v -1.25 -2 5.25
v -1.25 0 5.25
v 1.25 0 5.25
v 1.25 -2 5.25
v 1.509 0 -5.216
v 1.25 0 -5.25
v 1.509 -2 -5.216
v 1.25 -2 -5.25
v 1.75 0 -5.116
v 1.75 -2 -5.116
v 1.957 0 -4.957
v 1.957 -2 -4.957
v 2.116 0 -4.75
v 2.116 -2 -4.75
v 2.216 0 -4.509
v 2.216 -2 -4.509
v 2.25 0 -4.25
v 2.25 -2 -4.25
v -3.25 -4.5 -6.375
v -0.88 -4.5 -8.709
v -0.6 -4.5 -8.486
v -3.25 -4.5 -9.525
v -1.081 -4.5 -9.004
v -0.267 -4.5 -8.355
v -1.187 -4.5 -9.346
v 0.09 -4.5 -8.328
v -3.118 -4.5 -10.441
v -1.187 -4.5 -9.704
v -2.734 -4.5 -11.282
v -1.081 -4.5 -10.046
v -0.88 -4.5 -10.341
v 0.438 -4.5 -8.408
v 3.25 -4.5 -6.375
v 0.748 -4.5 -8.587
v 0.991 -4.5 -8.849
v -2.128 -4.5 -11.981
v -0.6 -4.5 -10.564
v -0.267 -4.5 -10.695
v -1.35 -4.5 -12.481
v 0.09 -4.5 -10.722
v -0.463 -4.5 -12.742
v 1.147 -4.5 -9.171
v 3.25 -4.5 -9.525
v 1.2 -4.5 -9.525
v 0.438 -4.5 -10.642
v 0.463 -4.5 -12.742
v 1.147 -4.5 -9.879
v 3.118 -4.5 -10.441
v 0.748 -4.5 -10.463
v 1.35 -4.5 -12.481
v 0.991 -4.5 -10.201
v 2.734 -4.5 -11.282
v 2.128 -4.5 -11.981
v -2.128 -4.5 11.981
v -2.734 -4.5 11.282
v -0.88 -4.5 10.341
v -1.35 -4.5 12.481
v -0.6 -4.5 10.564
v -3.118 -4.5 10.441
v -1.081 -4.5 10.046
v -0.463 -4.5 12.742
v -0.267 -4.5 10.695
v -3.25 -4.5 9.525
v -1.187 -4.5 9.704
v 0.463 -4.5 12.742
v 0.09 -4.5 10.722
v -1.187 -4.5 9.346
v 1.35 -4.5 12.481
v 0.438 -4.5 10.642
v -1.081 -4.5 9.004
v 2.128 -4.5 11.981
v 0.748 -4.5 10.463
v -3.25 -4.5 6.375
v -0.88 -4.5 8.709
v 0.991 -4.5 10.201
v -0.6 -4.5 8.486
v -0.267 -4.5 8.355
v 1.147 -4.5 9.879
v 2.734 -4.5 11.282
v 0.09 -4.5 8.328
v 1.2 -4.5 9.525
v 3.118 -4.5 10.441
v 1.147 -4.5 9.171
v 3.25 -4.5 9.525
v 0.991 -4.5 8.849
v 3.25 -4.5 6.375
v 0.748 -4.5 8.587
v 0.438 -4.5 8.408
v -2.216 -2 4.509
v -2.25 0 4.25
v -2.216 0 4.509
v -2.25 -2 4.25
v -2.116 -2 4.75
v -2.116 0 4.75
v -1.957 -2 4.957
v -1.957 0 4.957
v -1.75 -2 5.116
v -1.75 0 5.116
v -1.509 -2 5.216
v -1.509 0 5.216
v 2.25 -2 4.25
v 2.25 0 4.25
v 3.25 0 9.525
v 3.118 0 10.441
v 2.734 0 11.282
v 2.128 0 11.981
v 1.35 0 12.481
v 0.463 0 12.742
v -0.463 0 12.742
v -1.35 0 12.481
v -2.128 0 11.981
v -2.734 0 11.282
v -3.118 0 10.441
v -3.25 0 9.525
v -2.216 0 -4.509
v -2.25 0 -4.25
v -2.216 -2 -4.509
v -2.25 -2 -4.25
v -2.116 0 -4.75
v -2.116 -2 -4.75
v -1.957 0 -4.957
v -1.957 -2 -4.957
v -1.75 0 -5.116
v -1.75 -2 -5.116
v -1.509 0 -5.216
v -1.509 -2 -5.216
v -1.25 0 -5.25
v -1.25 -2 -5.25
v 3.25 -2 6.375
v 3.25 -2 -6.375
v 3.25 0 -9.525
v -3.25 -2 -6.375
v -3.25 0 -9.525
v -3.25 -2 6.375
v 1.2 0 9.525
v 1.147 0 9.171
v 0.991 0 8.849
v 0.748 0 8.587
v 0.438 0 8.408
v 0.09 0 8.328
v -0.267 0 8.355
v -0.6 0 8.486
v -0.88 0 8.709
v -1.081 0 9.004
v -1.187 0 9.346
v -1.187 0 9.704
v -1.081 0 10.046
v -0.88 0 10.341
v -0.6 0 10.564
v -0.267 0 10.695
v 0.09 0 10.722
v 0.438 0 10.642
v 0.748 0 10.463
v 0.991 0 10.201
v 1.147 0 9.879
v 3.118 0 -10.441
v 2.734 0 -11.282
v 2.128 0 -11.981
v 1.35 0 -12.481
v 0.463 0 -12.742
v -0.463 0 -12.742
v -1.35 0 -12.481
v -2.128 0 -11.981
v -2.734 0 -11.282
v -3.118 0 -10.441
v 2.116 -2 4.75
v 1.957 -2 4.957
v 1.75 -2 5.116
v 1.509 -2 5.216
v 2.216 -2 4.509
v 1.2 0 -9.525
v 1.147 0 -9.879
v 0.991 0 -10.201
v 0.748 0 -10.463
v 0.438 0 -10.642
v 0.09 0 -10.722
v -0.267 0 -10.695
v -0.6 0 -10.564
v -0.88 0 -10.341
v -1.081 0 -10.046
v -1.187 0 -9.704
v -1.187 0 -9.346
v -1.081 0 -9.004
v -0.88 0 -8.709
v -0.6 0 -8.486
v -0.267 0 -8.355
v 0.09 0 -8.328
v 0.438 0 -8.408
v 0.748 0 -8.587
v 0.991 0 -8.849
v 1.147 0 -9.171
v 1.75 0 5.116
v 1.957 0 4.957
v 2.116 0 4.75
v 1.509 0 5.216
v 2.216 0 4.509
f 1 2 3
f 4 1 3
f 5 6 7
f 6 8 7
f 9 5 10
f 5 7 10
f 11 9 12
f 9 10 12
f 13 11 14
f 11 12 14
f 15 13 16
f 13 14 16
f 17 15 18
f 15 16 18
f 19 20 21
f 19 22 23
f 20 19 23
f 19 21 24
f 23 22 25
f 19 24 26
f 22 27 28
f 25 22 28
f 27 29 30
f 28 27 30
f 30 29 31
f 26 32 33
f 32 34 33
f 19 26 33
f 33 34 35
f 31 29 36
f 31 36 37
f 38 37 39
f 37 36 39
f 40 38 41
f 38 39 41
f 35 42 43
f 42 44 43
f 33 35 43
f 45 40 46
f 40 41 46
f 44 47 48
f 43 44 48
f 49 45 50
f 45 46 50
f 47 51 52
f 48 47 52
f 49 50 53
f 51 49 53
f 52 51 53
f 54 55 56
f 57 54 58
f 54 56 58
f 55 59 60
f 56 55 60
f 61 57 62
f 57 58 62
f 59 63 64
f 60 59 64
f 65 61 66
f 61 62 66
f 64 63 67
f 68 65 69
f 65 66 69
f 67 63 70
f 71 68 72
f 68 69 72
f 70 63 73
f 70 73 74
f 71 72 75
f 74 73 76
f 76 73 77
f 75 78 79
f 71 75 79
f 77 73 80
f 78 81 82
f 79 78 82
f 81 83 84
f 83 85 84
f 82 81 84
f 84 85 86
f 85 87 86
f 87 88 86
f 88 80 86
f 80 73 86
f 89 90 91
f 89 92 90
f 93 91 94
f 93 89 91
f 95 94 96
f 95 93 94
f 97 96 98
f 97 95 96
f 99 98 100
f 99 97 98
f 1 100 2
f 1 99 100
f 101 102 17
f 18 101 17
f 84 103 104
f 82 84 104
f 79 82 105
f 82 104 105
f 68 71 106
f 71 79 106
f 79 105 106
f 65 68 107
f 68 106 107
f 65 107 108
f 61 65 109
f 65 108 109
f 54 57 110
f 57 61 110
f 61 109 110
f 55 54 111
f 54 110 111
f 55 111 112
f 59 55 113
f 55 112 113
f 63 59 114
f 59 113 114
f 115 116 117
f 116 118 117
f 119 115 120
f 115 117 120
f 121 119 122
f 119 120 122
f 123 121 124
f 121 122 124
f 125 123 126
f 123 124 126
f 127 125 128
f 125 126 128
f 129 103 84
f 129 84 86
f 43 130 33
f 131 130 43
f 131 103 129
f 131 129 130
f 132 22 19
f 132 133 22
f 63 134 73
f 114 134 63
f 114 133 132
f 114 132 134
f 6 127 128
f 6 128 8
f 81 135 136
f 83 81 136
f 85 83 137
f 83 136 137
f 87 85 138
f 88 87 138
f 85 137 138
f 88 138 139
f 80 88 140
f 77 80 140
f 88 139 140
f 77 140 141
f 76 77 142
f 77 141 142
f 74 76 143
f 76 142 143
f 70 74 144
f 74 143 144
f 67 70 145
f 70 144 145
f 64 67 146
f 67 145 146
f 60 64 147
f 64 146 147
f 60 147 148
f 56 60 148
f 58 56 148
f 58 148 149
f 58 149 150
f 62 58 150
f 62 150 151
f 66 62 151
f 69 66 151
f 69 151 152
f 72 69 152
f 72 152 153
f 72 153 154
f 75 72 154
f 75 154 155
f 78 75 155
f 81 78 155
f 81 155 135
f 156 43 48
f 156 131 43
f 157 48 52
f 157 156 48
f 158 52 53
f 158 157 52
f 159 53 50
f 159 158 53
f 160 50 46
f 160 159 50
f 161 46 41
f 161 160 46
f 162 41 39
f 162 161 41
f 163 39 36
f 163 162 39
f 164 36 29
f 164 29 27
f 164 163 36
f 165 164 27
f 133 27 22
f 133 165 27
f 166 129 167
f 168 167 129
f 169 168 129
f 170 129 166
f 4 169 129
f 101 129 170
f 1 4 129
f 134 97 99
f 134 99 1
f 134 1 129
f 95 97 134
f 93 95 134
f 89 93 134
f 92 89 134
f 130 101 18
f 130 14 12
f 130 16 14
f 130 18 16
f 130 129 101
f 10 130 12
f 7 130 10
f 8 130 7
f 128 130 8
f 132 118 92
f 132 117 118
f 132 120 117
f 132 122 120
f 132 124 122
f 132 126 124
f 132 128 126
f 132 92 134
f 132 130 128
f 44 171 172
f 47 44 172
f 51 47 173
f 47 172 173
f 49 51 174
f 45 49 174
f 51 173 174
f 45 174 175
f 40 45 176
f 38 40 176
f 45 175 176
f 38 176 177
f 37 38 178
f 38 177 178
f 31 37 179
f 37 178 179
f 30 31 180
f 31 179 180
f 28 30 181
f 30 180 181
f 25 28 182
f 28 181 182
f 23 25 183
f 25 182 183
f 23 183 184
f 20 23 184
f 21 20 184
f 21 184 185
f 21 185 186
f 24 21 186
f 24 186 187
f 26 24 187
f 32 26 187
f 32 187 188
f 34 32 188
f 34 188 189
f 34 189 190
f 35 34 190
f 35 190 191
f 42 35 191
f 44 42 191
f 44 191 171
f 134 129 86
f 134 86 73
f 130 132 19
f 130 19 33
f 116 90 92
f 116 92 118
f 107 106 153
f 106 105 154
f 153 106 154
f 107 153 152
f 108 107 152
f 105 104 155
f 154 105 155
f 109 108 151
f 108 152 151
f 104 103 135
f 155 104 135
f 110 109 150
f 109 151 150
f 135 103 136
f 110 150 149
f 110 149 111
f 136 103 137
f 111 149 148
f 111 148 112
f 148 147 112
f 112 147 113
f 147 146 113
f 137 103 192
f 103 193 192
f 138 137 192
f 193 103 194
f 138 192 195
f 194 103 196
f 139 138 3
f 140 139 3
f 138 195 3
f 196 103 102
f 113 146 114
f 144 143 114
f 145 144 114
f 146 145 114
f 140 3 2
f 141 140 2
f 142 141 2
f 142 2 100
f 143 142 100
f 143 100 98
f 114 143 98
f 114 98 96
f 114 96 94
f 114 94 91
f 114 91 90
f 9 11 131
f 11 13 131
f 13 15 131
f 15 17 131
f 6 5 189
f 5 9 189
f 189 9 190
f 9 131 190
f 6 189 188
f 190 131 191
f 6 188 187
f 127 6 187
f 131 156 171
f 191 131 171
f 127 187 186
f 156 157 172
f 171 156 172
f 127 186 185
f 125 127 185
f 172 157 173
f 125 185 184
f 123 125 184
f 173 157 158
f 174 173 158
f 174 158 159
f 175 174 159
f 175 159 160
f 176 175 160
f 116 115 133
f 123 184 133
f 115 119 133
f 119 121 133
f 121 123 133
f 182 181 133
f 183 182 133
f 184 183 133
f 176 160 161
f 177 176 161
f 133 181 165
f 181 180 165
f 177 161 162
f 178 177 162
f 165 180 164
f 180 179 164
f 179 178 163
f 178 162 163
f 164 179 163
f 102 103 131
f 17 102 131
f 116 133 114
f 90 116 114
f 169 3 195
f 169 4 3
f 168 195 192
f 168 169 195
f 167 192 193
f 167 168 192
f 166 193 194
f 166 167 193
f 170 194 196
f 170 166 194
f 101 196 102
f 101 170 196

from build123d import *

# Parameters (mm, degrees)
SKETCH1_W            = 4.5
SKETCH1_H            = 10.5
BOSS_EXTRUDE1_DEPTH  = 2
BOSS_EXTRUDE2_START  = -2
BOSS_EXTRUDE2_DEPTH  = 2.5
M2_CLEARANCE_HOLE1_D = 2.4
FILLET1_R            = 1


with BuildPart() as part:
    # Sketch1 → Boss-Extrude1 (new body)
    with BuildSketch(Plane(origin=(0, 0, 0), x_dir=(1, 0, 0), z_dir=(0, 1, 0))):
        with BuildLine():
            Line((3.25, 9.525), (3.25, -9.525))
            ThreePointArc((3.25, -9.525), (0, -12.775), (-3.25, -9.525))
            Line((-3.25, -9.525), (-3.25, 9.525))
            ThreePointArc((-3.25, 9.525), (0, 12.775), (3.25, 9.525))
        make_face()
        Rectangle(SKETCH1_W, SKETCH1_H, mode=Mode.SUBTRACT)
    extrude(amount=-BOSS_EXTRUDE1_DEPTH)

    # Sketch1<3> → Boss-Extrude2 (add)
    with BuildSketch(Plane(origin=(0, 0, 0), x_dir=(1, 0, 0), z_dir=(0, 1, 0)).offset(BOSS_EXTRUDE2_START)):
        with BuildLine():
            Line((-3.25, 9.525), (-3.25, 6.375))
            Line((-3.25, 6.375), (3.25, 6.375))
            Line((3.25, 6.375), (3.25, 9.525))
            ThreePointArc((3.25, 9.525), (0, 12.775), (-3.25, 9.525))
        make_face()
        with BuildLine():
            Line((3.25, -6.375), (-3.25, -6.375))
            Line((-3.25, -6.375), (-3.25, -9.525))
            ThreePointArc((-3.25, -9.525), (0, -12.775), (3.25, -9.525))
            Line((3.25, -9.525), (3.25, -6.375))
        make_face()
    extrude(amount=-BOSS_EXTRUDE2_DEPTH)

    # M2 Clearance Hole1 (through all)
    with Locations(Plane(origin=(0, -4.5, 0), x_dir=(-1, 0, 0), z_dir=(0, -1, 0))):
        with Locations((0, 9.525), (0, -9.525)):
            Hole(M2_CLEARANCE_HOLE1_D / 2)

    # Fillet1
    fillet1_edges = [part.edges().sort_by_distance(p)[0] for p in [
        (-2.25, -1, 5.25),
        (2.25, -1, 5.25),
        (2.25, -1, -5.25),
        (-2.25, -1, -5.25),
    ]]
    fillet(fillet1_edges, radius=FILLET1_R)


solid = part.part
